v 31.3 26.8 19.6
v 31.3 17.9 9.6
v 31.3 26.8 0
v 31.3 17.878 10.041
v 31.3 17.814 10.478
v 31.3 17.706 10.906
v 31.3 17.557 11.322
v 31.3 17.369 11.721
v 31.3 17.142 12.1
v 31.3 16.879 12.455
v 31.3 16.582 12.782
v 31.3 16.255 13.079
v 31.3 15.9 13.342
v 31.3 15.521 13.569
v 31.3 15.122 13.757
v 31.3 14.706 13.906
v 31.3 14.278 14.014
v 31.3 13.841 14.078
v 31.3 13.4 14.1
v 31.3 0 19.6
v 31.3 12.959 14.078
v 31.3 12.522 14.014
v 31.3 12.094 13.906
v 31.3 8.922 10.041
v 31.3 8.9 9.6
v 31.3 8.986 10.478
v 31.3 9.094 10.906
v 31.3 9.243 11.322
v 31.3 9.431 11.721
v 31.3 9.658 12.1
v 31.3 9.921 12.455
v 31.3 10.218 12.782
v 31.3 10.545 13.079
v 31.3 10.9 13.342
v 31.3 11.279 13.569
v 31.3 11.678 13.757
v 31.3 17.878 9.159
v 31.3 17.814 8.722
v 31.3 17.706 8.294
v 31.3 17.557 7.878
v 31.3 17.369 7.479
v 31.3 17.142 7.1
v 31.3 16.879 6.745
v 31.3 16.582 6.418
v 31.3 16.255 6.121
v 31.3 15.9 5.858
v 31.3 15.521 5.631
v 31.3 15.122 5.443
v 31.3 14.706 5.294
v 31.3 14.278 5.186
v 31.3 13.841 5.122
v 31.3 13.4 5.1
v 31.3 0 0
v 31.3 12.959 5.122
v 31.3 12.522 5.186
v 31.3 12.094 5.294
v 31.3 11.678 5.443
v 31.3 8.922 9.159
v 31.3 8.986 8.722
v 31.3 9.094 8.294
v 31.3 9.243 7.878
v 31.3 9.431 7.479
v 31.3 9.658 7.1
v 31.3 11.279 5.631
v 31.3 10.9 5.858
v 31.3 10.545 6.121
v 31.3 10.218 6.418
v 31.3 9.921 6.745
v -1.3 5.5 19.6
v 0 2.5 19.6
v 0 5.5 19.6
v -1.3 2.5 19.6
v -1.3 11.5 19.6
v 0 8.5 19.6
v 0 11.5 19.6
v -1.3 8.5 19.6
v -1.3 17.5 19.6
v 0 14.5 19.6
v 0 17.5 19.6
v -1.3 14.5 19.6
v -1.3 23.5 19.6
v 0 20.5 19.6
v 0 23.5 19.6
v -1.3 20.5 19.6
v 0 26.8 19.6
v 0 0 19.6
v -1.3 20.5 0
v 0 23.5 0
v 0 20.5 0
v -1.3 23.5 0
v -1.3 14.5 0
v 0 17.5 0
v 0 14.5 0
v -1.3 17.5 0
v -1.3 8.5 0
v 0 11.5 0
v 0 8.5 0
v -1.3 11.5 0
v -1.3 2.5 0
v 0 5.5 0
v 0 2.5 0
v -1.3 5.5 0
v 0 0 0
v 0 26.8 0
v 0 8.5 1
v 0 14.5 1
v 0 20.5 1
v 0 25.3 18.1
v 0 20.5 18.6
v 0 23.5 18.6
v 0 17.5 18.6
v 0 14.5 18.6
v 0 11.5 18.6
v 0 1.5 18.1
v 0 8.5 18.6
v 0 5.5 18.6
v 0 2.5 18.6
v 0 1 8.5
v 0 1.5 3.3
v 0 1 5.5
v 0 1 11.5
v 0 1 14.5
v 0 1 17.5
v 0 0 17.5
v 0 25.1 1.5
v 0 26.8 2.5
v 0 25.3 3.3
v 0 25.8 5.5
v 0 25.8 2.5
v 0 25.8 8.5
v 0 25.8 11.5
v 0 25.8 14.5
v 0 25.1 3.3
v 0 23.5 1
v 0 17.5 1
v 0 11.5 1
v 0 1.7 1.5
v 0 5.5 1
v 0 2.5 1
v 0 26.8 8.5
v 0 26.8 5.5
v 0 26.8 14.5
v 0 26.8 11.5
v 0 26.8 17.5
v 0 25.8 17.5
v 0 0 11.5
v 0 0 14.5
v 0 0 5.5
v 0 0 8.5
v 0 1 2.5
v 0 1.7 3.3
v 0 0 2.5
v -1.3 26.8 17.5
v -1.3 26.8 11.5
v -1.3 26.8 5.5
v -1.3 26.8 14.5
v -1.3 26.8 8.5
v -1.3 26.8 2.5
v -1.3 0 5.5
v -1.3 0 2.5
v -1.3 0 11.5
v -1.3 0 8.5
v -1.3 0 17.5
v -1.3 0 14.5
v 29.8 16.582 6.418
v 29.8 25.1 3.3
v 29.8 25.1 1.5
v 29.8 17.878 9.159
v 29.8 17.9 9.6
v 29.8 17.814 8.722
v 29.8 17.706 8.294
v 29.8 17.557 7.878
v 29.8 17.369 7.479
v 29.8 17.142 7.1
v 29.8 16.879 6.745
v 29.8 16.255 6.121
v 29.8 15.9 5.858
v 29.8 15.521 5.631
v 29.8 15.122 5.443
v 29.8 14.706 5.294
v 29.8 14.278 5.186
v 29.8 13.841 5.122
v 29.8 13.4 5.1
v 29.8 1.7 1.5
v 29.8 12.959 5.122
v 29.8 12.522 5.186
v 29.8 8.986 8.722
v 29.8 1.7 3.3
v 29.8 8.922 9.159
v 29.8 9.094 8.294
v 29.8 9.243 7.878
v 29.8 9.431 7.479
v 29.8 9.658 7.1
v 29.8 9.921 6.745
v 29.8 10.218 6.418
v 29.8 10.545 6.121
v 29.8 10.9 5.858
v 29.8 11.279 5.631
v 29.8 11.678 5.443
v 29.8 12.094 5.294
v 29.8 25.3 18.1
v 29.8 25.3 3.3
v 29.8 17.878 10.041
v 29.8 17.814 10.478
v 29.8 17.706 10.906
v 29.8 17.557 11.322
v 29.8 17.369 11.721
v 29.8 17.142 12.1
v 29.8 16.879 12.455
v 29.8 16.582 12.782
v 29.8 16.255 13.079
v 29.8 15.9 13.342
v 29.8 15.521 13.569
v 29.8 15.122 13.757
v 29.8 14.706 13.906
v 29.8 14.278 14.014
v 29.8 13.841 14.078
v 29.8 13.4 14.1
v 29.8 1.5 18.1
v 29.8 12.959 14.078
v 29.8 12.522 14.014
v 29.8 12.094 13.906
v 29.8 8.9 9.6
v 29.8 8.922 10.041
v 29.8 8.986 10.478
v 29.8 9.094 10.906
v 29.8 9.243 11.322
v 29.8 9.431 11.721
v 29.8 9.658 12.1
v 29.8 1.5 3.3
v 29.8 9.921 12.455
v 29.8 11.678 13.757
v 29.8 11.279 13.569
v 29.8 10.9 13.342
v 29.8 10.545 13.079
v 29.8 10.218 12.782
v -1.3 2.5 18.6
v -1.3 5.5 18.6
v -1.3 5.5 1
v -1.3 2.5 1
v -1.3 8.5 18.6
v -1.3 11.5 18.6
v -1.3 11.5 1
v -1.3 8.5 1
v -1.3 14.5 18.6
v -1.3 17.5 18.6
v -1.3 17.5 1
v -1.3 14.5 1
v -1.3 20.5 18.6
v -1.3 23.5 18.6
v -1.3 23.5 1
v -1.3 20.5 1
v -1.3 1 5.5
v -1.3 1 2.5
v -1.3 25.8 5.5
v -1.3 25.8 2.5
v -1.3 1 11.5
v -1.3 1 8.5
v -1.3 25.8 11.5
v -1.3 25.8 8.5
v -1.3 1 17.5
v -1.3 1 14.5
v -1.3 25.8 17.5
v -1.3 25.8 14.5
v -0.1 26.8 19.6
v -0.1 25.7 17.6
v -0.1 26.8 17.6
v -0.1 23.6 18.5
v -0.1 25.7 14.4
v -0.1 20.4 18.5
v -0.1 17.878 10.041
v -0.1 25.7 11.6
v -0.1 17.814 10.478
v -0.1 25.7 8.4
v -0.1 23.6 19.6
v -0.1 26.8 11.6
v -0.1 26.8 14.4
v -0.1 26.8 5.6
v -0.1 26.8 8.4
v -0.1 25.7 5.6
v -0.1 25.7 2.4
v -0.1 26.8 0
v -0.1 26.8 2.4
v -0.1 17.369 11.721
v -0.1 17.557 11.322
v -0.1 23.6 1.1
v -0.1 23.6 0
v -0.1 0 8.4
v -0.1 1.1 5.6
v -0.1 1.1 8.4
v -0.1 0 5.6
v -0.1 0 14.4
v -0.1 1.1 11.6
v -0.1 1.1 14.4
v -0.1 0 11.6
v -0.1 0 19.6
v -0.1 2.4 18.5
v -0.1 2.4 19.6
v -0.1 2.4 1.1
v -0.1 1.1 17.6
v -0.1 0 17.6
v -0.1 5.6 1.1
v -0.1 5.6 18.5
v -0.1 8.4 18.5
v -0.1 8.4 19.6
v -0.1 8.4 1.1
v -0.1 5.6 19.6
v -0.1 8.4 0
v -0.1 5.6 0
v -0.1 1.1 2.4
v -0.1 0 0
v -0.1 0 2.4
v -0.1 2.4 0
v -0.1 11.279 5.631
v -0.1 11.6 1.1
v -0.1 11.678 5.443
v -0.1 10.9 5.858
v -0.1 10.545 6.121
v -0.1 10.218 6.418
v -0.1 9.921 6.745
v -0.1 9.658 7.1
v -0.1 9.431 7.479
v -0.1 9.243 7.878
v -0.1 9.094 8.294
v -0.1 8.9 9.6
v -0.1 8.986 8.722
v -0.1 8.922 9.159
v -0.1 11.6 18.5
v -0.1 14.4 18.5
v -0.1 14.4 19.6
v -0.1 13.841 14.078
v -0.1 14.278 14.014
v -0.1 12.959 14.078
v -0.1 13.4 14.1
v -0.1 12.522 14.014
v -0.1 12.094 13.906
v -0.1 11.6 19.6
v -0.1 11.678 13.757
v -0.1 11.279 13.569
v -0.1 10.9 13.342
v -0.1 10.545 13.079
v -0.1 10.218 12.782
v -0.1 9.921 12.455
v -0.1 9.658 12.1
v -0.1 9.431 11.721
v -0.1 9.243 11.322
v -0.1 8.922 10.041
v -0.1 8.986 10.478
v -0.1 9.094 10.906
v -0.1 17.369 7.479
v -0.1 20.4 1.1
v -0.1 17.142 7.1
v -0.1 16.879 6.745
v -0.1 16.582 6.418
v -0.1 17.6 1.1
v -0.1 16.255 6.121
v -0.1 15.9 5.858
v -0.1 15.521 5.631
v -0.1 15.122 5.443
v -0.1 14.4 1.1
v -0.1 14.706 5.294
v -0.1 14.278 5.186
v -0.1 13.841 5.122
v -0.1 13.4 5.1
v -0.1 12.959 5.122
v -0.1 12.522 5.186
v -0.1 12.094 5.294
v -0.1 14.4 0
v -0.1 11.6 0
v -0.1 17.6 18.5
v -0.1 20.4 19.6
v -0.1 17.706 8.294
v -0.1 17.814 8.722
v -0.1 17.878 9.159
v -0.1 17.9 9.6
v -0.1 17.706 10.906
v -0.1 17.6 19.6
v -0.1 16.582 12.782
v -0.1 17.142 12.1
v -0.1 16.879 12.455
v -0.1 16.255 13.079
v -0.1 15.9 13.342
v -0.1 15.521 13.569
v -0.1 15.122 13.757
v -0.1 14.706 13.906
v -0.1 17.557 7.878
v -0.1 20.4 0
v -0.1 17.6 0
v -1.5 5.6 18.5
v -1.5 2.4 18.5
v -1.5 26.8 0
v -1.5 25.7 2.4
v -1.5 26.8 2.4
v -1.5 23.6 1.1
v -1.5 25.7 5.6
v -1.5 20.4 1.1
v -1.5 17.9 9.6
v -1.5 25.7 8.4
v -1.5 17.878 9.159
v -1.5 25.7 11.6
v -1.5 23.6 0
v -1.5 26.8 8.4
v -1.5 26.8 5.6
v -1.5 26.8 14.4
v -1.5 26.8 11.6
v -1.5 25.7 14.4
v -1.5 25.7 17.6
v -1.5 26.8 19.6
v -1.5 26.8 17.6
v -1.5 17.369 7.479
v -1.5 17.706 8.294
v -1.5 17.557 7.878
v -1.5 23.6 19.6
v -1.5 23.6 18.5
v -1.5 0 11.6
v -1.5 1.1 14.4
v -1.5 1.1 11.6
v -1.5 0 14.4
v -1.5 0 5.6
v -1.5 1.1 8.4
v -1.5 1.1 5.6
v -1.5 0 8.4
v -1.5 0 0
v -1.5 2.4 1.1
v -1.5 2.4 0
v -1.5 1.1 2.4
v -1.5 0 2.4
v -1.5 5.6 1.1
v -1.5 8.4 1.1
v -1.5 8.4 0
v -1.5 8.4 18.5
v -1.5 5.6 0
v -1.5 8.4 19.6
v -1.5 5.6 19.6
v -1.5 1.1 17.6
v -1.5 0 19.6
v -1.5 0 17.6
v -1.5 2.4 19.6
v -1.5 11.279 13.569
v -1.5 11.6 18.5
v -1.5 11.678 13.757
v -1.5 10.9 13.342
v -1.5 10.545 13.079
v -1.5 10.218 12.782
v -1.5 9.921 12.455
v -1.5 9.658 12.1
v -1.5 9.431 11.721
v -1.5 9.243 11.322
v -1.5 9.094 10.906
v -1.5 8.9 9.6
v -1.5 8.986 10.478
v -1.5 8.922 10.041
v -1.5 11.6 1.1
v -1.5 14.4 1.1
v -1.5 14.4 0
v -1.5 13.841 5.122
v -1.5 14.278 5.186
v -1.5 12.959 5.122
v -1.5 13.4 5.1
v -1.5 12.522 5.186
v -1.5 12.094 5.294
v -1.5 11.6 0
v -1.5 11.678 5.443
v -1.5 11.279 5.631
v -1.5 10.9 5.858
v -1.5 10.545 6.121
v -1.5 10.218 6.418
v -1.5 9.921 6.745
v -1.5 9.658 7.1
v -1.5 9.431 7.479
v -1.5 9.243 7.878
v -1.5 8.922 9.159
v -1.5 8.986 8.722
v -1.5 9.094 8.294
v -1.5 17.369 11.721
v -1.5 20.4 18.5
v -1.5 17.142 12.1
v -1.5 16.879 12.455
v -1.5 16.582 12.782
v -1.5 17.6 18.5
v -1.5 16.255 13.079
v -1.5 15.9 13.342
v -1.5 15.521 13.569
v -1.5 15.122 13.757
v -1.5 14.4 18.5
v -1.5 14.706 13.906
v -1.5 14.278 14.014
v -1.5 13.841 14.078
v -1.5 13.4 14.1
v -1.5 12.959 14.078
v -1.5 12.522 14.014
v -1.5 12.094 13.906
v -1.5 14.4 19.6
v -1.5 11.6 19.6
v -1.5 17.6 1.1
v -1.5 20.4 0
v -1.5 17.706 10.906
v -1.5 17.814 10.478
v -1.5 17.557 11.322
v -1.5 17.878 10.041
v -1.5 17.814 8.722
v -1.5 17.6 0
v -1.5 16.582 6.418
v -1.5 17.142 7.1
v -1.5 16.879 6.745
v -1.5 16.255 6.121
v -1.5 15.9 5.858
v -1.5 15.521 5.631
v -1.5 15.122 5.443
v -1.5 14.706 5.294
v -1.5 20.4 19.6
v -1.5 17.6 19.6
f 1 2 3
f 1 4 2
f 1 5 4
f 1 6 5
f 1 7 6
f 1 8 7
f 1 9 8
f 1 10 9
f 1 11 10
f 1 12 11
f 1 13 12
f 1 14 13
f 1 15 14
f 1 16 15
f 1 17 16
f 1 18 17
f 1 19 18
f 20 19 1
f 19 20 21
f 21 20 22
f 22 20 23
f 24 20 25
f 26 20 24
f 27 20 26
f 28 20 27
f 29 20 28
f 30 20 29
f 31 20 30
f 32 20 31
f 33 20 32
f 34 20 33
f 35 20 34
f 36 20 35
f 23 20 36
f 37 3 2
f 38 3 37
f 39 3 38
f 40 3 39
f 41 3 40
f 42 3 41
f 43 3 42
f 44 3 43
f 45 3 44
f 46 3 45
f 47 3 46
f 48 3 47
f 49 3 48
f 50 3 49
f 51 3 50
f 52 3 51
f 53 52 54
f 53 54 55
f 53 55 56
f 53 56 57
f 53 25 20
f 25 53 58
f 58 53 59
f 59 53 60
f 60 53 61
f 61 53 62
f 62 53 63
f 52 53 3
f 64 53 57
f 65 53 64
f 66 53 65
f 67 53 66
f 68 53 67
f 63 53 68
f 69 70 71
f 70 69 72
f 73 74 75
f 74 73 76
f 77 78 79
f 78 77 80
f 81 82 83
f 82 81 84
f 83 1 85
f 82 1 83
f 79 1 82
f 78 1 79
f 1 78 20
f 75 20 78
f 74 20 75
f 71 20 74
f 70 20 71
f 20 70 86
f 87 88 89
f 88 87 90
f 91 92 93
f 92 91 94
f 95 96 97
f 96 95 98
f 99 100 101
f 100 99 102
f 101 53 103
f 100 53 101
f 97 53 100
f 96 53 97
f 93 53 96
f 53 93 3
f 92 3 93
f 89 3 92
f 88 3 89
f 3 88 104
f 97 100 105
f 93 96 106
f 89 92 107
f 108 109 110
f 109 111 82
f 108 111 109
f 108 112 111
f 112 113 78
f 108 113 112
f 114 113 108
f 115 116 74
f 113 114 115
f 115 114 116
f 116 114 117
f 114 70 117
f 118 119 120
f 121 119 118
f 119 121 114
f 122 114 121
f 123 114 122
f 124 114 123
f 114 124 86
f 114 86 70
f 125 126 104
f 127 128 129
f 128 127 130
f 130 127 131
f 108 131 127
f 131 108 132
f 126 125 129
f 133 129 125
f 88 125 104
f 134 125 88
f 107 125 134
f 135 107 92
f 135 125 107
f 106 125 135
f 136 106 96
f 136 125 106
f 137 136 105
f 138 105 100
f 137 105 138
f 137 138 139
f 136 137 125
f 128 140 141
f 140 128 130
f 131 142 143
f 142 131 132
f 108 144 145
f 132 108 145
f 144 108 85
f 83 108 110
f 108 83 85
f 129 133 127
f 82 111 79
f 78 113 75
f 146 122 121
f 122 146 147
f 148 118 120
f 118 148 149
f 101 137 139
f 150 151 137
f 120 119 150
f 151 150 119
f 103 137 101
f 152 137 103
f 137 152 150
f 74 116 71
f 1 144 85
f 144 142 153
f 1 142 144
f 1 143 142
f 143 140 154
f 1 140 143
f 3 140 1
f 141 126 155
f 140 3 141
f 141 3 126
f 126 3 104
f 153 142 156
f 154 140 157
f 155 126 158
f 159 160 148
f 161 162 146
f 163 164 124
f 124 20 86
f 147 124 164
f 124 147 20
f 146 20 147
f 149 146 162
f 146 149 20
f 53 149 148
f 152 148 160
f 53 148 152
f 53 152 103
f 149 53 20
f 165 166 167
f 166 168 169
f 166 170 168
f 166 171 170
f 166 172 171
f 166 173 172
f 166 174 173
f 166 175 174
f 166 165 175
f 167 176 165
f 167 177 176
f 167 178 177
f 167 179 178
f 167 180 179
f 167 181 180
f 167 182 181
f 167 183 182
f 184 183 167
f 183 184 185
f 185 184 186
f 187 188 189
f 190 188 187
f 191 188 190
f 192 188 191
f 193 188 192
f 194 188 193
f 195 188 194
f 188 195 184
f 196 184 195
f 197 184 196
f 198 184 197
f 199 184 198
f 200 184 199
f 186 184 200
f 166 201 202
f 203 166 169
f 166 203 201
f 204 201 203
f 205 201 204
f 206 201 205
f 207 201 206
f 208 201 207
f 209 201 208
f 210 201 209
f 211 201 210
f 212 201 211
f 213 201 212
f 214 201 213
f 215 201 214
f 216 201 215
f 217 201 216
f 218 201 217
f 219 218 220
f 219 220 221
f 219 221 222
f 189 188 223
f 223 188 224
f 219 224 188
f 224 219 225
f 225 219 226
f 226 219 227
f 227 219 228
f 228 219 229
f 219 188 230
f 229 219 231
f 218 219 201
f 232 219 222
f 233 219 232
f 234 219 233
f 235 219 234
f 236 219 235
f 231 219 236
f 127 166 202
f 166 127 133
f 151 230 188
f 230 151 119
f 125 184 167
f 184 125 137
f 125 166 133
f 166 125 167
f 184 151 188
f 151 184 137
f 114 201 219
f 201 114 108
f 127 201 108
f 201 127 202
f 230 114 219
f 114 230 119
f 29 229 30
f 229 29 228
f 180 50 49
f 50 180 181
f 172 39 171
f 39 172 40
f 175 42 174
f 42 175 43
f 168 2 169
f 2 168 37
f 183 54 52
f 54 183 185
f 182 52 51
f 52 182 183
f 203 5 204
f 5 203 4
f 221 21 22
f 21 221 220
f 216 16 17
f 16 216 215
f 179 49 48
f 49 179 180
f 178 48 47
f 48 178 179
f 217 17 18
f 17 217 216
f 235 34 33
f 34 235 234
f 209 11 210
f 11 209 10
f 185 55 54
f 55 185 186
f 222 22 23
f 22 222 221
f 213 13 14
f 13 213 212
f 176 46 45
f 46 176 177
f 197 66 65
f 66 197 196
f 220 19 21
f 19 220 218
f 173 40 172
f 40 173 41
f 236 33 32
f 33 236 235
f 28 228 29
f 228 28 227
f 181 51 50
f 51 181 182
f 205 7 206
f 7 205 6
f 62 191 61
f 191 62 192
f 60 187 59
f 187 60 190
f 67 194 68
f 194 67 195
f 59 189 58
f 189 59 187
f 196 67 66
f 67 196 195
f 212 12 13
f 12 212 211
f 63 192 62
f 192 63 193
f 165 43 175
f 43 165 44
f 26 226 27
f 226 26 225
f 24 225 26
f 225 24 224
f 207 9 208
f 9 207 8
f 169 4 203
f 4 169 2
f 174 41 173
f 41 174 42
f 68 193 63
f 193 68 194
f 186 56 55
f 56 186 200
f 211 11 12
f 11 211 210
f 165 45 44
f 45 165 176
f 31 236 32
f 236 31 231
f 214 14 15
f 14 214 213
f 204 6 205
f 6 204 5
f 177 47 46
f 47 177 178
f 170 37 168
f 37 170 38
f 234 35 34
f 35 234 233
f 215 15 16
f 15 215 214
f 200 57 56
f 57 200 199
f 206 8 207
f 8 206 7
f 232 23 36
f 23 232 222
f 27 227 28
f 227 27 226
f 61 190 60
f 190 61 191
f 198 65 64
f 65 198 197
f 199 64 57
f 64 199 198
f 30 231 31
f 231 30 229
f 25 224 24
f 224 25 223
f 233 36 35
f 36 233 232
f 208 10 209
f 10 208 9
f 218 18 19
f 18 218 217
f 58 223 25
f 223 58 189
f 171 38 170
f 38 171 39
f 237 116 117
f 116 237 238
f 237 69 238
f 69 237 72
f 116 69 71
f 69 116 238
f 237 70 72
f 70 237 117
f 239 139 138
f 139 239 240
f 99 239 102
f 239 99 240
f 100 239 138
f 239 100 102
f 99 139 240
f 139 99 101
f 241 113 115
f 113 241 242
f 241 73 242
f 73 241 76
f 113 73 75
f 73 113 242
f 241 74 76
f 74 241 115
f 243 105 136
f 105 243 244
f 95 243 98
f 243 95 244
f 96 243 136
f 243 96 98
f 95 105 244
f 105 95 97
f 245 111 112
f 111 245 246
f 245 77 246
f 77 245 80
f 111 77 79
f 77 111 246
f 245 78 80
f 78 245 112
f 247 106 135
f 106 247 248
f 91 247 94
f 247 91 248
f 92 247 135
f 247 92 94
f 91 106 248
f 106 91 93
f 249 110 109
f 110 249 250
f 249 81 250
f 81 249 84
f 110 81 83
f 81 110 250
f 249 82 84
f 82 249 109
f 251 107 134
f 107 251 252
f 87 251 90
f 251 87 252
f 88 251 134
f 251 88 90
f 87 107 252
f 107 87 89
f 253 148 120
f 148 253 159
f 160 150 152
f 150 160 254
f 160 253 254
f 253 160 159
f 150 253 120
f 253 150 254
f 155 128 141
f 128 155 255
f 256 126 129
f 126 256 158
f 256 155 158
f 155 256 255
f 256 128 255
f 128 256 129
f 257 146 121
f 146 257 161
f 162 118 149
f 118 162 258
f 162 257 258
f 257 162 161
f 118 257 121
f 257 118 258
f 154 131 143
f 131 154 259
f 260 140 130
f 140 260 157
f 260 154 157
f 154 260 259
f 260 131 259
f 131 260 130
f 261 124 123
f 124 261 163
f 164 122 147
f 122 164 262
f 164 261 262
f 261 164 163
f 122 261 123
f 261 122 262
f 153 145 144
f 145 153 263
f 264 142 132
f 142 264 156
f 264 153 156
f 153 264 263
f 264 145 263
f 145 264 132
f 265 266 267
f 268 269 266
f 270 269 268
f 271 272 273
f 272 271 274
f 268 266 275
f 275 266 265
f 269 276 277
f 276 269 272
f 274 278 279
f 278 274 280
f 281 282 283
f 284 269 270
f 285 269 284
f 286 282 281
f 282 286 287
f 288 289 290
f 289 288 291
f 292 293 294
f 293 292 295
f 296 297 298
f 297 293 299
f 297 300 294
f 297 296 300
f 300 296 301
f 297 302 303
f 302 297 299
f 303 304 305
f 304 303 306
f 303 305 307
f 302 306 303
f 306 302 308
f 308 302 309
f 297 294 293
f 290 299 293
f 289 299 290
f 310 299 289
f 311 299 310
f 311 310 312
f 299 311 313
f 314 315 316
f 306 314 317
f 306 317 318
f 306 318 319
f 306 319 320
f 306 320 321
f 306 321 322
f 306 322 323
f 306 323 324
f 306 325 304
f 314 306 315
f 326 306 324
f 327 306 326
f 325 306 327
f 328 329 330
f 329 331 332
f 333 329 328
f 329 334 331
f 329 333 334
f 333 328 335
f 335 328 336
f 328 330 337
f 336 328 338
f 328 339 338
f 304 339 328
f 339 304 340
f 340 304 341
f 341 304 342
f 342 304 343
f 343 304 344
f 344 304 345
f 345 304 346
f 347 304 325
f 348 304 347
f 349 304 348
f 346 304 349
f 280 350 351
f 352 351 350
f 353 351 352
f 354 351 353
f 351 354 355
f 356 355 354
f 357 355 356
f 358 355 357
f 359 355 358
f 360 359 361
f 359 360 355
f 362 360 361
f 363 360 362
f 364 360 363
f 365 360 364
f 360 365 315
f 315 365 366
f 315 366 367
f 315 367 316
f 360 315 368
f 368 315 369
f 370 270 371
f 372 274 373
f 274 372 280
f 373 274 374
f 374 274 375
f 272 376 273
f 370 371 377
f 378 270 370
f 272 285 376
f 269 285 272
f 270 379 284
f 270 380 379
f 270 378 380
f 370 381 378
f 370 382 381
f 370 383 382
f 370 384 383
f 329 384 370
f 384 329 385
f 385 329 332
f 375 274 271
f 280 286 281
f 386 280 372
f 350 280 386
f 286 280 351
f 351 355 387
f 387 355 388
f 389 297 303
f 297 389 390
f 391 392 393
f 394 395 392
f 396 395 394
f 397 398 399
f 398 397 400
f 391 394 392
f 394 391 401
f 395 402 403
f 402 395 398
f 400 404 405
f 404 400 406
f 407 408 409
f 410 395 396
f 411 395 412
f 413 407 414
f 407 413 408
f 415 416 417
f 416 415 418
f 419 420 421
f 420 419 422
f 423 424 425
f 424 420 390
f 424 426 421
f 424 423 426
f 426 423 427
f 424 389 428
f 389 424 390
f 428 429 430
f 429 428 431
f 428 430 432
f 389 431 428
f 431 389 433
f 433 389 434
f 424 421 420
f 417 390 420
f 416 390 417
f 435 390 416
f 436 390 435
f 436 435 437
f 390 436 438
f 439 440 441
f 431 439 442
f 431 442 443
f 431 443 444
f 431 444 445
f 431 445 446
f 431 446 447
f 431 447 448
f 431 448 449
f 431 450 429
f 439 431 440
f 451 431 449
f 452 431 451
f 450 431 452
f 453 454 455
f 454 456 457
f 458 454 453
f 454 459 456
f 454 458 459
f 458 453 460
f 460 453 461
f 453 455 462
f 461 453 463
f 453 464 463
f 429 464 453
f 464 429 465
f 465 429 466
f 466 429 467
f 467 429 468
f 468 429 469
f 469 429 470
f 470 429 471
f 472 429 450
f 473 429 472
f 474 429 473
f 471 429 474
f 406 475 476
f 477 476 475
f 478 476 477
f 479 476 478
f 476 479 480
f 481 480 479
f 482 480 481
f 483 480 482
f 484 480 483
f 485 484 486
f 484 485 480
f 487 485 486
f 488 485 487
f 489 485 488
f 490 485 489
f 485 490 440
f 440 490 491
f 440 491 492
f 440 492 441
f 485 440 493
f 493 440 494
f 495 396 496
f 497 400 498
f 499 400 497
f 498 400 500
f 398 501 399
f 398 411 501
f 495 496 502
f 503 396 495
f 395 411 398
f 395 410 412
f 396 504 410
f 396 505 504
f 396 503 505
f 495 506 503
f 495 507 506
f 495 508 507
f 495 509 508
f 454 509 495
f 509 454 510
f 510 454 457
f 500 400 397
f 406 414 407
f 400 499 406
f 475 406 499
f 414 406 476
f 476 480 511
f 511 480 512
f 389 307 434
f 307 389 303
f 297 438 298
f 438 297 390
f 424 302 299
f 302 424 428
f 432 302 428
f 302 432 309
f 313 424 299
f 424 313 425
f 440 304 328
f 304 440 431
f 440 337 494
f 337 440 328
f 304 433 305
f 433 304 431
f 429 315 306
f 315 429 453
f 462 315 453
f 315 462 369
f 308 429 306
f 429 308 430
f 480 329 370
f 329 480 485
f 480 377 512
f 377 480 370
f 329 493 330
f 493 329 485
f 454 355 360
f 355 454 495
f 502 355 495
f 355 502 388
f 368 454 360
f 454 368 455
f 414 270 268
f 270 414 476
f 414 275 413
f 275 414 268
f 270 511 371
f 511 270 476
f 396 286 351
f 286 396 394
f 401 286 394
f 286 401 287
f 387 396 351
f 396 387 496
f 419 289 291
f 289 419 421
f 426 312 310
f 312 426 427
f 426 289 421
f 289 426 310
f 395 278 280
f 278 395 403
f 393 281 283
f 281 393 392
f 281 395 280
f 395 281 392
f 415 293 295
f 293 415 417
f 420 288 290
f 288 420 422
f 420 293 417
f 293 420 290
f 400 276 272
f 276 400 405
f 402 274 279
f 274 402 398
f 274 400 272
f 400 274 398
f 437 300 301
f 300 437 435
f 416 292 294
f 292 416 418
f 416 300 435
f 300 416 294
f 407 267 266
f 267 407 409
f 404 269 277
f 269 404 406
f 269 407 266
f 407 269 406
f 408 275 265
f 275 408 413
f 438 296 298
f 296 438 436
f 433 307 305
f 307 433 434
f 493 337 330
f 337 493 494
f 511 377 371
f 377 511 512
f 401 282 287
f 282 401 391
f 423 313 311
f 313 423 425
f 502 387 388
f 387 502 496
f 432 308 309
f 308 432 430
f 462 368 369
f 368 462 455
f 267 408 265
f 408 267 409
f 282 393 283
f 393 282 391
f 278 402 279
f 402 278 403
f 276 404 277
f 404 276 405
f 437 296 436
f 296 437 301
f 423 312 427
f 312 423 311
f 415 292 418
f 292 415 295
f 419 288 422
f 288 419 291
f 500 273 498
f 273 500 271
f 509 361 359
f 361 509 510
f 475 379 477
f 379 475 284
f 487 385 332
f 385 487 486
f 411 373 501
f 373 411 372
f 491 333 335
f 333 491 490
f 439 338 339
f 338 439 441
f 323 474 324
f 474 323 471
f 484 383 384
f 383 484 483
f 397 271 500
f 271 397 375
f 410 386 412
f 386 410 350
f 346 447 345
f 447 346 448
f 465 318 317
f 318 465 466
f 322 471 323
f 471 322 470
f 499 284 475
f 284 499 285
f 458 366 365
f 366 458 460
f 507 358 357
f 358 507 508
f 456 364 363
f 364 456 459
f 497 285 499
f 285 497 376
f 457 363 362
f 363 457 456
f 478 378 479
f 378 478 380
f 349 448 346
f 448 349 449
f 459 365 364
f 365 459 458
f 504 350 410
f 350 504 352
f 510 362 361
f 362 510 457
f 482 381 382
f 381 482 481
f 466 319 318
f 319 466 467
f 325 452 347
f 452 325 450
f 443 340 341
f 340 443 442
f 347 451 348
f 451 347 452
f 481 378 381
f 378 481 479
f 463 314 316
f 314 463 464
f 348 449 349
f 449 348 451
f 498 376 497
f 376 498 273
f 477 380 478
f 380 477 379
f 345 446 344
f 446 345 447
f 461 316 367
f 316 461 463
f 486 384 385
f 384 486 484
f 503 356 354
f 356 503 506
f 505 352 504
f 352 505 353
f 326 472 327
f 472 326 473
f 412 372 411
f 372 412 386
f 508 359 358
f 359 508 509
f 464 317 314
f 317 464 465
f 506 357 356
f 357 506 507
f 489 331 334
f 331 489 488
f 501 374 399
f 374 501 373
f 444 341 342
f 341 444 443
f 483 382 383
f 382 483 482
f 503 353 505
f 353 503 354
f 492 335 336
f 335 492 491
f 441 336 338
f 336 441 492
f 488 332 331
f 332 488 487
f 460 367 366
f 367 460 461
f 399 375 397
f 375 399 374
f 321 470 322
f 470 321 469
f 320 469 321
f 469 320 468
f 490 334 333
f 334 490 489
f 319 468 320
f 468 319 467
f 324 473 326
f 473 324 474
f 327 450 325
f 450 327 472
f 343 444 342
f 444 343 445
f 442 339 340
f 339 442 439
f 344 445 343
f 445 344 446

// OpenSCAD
// Attenuator enclosure with a castellated lid on the slide-in end.
//
// Houses the 29 x 23 x 1.6 mm attenuator PCB (attenuator.kicad_pcb).
// The board slides in from one short end, along the RCA barrel axis (X).
// The two RCA jacks sit 4.5 mm in from each short end and face opposite
// directions; their barrels stick out the two short ends and pass through
// openings in the two end faces.
//
// The slide-in end is closed by a lid (a separate part) held by a ring of
// castellations: the ends of the four enclosure walls carry tabs that stick out
// by cast_d, and the lid's rim has matching notches cut out of it that those
// tabs pass through. The lid is therefore a plate of uniform thickness - the
// castellations are cutouts in it rather than teeth added to it. The tab/notch
// comb stops the lid from spinning about the mating axis (X) or being pulled
// sideways out of the interface. Pulling the lid straight off is resisted only
// by friction; it is not meant to be removed.
//
// Build: openscad -o enclosure.stl enclosure.scad
// Both parts land in one file as two solids; enclosure/build_parts.sh writes them
// as two separate STLs in print orientation, and enclosure/check_castellations.py
// shows how to render each part on its own.

// ---- Parameters ----
board_x   = 29.0;   // board length (X, slide-in axis)
board_y   = 23.0;   // board width  (Y)
board_z   = 1.6;    // board thickness (Z)
side_clr  = 0.4;    // min clearance on each side (X, Y)
top_clr   = 15.0;   // clearance above the board top (Z)
slot_clr  = 0.2;    // board-to-slot clearance (Y per side, Z above the board)
wall      = 1.5;    // wall thickness

// Lid
lid_t     = 1.5;    // lid plate thickness (X); the lid is one uniform thickness
fit_clr   = 0.1;    // clearance between the lid plate and the enclosure end face

// Castellations: tabs on the enclosure's wall ends that pass through notches cut
// out of the lid's rim. enclosure() and lid() both take a `castellations` flag;
// passing false renders the parts with no interface, which is what
// enclosure/check_castellations.py subtracts to get the tab and notch volumes.
// cast_d has to stay below lid_t, otherwise a tab would poke out of the lid's
// outer face; wall - 0.2 leaves 0.2 mm of lid beyond every tab.
cast_d    = wall - 0.2; // how far a tab sticks out of the wall end (X)
cast_w    = 3.0;    // tab width along the rim
cast_gap  = 3.0;    // gap between neighbouring tabs
cast_pd   = 1.0;    // tab depth into the wall (perpendicular to the rim)
cast_clr  = 0.1;    // clearance between a tab and its notch
cast_off  = 1.0;    // offset of the first tab from the rim corner

// ---- Derived sizes ----
cav_x = board_x + 2*side_clr;   // 29.8
cav_y = board_y + 2*side_clr;   // 23.8
cav_z = board_z + top_clr;      // 16.6
out_x = cav_x + wall;           // 31.3  (the slide-in end is closed by the lid)
out_y = cav_y + 2*wall;         // 26.8
out_z = cav_z + 2*wall;         // 19.6

// Board slot: a tight channel along X that the board slides into from the
// left. It is the lower part of the cavity, narrowed in Y (by fin_w per
// side) and only slot_h tall (board_z + slot_clr), so its walls grip the
// board in Y and its ceiling stops it in Z, capturing it fully. The
// full-width upper cavity sits above the slot for the barrels.
fin_w  = side_clr - slot_clr;   // 0.2 (slot narrowing per side, in Y)
slot_h = board_z + slot_clr;    // 1.8 (slot channel height, from the floor)

// RCA barrel geometry
barrel_dia = 8.3;               // barrel outer diameter (mm)
open_dia   = barrel_dia + 0.7;  // end-face opening diameter (9.0)
barrel_h   = 6.5;               // barrel axis height above the board top
axis_y     = wall + side_clr + board_y/2;  // 13.4 (board Y center)
axis_z     = wall + board_z + barrel_h;    // 9.6  (barrel axis Z)

// Castellation layout. The rim at the open end is a ring of wall material: the
// top and bottom walls run along Y, the left and right walls along Z. Each tab
// starts cast_off from the inner corner of the ring and repeats every
// cast_w + cast_gap, stopping before the far corner so the tabs of the two
// walls meeting at a corner never overlap.
function rim_starts(from, to) = [
  for (t = from; t + cast_w <= to; t = t + cast_w + cast_gap) t
];
rim_y = rim_starts(wall + cast_off, out_y - wall);  // top and bottom walls
rim_z = rim_starts(wall + cast_off, out_z - wall);  // left and right walls

// The enclosure is a box with the slide-in end open. The board slides into a
// tight slot (a channel along X, open at the slide-in end) that grips the
// board in Y and Z, holding it securely; the space above the slot is full
// width for the RCA barrels and jack bodies. The right end face has a hole
// for the J2 RCA barrel. The ends of the four walls carry the castellation tabs
// that pass through the notches cut in the lid's rim. The J1 barrel passes
// through a matching hole in the lid (see lid() below).
module enclosure(castellations = true) {
  difference() {
    // Outer shell.
    cube([out_x, out_y, out_z]);
    // Board slot: the lower part of the internal cavity, a tight channel along
    // X, open on the left (slide-in) end. Narrowed in Y (by fin_w per side) and
    // only slot_h tall, so its walls grip the board in Y and its ceiling stops
    // it in Z, capturing it fully. The board slides in from the left and is
    // held securely by this slot.
    translate([0, wall + fin_w, wall])
      cube([cav_x, cav_y - 2*fin_w, slot_h]);
    // Upper cavity: the full-width space above the slot, for the RCA barrels
    // and jack bodies.
    translate([0, wall, wall + slot_h])
      cube([cav_x, cav_y, cav_z - slot_h]);
    // Right end-face RCA barrel opening: a hole through the right wall, along
    // X, centered on the barrel axis (axis_y, axis_z).
    translate([cav_x - 1, axis_y, axis_z])
      rotate([0, 90, 0])
        cylinder(h = wall + 2, d = open_dia, $fn = 64);
  }

  // Castellation tabs on the wall ends, sticking out by cast_d so they thread
  // through the notches cut in the lid.
  if (castellations) {
    // Top and bottom walls, tabs spaced along Y.
    for (t = rim_y) {
      translate([-cast_d, t, out_z - cast_pd]) cube([cast_d, cast_w, cast_pd]);
      translate([-cast_d, t, 0]) cube([cast_d, cast_w, cast_pd]);
    }
    // Left (slide-in) and right walls, tabs spaced along Z.
    for (t = rim_z) {
      translate([-cast_d, 0, t]) cube([cast_d, cast_pd, cast_w]);
      translate([-cast_d, out_y - cast_pd, t]) cube([cast_d, cast_pd, cast_w]);
    }
  }
}

// ---- Lid (separate part) ----
// The lid is a plate of uniform thickness whose rim is notched: one notch for
// each tab on the enclosure's wall ends, cast_clr wider than the tab and cut
// through the whole plate from the mating face.  The tab ends cast_d from the
// mating face, so it sits in the slot with lid_t - cast_d to spare before the
// outer face.  Nothing sticks out of the plate, so the lid stays one thickness.
// Rotating the lid about the mating axis (X) drives the notch walls into the
// tabs, so the lid cannot turn; pulling it straight off is resisted only by
// friction.
module lid(castellations = true) {
  difference() {
    // Lid plate (with clearance to the enclosure shell at the open end).
    translate([-lid_t, 0, 0])
      cube([lid_t - fit_clr, out_y, out_z]);
    // Notches for the enclosure's wall tabs, cast_clr roomier than the tab on
    // the inside and open at the lid's outer edge.
    if (castellations) {
      for (t = rim_y) {
        // Top wall tabs.
        translate([-lid_t, t - cast_clr, out_z - cast_pd - cast_clr])
          cube([lid_t - fit_clr,
                cast_w + 2 * cast_clr, cast_pd + 2 * cast_clr]);
        // Bottom wall tabs.
        translate([-lid_t, t - cast_clr, -cast_clr])
          cube([lid_t - fit_clr,
                cast_w + 2 * cast_clr, cast_pd + 2 * cast_clr]);
      }
      for (t = rim_z) {
        // Left (slide-in) wall tabs.
        translate([-lid_t, -cast_clr, t - cast_clr])
          cube([lid_t - fit_clr,
                cast_pd + 2 * cast_clr, cast_w + 2 * cast_clr]);
        // Right wall tabs.
        translate([-lid_t, out_y - cast_pd - cast_clr, t - cast_clr])
          cube([lid_t - fit_clr,
                cast_pd + 2 * cast_clr, cast_w + 2 * cast_clr]);
      }
    }
    // J1 barrel opening: a hole through the lid plate, along X, centered on
    // the barrel axis (axis_y, axis_z).
    translate([-lid_t - 1, axis_y, axis_z])
      rotate([0, 90, 0])
        cylinder(h = lid_t + 2, d = open_dia, $fn = 64);
  }
}

// ---- Print orientations ----
// Both parts print with the castellation interface facing up (+Z): the body
// stands on its solid far end wall with the sockets opening at the top, and the
// lid lies flat on its plate with the teeth pointing up. In that orientation the
// RCA barrel bores run vertically with their outer openings downward.
module enclosure_print() {
  translate([0, 0, out_x]) rotate([0, 90, 0]) enclosure();
}

module lid_print() {
  translate([out_z, 0, lid_t]) rotate([0, -90, 0]) lid();
}

// Both parts in their print orientations, side by side with their long edges
// facing each other and a 2 mm gap, so one STL can hold the whole print job and
// the footprint stays close to square rather than a 19.6 x 55.6 strip.
module print_all() {
  enclosure_print();
  translate([out_z + 2, 0, 0]) lid_print();
}

// ---- Render both parts ----
enclosure();
lid();
